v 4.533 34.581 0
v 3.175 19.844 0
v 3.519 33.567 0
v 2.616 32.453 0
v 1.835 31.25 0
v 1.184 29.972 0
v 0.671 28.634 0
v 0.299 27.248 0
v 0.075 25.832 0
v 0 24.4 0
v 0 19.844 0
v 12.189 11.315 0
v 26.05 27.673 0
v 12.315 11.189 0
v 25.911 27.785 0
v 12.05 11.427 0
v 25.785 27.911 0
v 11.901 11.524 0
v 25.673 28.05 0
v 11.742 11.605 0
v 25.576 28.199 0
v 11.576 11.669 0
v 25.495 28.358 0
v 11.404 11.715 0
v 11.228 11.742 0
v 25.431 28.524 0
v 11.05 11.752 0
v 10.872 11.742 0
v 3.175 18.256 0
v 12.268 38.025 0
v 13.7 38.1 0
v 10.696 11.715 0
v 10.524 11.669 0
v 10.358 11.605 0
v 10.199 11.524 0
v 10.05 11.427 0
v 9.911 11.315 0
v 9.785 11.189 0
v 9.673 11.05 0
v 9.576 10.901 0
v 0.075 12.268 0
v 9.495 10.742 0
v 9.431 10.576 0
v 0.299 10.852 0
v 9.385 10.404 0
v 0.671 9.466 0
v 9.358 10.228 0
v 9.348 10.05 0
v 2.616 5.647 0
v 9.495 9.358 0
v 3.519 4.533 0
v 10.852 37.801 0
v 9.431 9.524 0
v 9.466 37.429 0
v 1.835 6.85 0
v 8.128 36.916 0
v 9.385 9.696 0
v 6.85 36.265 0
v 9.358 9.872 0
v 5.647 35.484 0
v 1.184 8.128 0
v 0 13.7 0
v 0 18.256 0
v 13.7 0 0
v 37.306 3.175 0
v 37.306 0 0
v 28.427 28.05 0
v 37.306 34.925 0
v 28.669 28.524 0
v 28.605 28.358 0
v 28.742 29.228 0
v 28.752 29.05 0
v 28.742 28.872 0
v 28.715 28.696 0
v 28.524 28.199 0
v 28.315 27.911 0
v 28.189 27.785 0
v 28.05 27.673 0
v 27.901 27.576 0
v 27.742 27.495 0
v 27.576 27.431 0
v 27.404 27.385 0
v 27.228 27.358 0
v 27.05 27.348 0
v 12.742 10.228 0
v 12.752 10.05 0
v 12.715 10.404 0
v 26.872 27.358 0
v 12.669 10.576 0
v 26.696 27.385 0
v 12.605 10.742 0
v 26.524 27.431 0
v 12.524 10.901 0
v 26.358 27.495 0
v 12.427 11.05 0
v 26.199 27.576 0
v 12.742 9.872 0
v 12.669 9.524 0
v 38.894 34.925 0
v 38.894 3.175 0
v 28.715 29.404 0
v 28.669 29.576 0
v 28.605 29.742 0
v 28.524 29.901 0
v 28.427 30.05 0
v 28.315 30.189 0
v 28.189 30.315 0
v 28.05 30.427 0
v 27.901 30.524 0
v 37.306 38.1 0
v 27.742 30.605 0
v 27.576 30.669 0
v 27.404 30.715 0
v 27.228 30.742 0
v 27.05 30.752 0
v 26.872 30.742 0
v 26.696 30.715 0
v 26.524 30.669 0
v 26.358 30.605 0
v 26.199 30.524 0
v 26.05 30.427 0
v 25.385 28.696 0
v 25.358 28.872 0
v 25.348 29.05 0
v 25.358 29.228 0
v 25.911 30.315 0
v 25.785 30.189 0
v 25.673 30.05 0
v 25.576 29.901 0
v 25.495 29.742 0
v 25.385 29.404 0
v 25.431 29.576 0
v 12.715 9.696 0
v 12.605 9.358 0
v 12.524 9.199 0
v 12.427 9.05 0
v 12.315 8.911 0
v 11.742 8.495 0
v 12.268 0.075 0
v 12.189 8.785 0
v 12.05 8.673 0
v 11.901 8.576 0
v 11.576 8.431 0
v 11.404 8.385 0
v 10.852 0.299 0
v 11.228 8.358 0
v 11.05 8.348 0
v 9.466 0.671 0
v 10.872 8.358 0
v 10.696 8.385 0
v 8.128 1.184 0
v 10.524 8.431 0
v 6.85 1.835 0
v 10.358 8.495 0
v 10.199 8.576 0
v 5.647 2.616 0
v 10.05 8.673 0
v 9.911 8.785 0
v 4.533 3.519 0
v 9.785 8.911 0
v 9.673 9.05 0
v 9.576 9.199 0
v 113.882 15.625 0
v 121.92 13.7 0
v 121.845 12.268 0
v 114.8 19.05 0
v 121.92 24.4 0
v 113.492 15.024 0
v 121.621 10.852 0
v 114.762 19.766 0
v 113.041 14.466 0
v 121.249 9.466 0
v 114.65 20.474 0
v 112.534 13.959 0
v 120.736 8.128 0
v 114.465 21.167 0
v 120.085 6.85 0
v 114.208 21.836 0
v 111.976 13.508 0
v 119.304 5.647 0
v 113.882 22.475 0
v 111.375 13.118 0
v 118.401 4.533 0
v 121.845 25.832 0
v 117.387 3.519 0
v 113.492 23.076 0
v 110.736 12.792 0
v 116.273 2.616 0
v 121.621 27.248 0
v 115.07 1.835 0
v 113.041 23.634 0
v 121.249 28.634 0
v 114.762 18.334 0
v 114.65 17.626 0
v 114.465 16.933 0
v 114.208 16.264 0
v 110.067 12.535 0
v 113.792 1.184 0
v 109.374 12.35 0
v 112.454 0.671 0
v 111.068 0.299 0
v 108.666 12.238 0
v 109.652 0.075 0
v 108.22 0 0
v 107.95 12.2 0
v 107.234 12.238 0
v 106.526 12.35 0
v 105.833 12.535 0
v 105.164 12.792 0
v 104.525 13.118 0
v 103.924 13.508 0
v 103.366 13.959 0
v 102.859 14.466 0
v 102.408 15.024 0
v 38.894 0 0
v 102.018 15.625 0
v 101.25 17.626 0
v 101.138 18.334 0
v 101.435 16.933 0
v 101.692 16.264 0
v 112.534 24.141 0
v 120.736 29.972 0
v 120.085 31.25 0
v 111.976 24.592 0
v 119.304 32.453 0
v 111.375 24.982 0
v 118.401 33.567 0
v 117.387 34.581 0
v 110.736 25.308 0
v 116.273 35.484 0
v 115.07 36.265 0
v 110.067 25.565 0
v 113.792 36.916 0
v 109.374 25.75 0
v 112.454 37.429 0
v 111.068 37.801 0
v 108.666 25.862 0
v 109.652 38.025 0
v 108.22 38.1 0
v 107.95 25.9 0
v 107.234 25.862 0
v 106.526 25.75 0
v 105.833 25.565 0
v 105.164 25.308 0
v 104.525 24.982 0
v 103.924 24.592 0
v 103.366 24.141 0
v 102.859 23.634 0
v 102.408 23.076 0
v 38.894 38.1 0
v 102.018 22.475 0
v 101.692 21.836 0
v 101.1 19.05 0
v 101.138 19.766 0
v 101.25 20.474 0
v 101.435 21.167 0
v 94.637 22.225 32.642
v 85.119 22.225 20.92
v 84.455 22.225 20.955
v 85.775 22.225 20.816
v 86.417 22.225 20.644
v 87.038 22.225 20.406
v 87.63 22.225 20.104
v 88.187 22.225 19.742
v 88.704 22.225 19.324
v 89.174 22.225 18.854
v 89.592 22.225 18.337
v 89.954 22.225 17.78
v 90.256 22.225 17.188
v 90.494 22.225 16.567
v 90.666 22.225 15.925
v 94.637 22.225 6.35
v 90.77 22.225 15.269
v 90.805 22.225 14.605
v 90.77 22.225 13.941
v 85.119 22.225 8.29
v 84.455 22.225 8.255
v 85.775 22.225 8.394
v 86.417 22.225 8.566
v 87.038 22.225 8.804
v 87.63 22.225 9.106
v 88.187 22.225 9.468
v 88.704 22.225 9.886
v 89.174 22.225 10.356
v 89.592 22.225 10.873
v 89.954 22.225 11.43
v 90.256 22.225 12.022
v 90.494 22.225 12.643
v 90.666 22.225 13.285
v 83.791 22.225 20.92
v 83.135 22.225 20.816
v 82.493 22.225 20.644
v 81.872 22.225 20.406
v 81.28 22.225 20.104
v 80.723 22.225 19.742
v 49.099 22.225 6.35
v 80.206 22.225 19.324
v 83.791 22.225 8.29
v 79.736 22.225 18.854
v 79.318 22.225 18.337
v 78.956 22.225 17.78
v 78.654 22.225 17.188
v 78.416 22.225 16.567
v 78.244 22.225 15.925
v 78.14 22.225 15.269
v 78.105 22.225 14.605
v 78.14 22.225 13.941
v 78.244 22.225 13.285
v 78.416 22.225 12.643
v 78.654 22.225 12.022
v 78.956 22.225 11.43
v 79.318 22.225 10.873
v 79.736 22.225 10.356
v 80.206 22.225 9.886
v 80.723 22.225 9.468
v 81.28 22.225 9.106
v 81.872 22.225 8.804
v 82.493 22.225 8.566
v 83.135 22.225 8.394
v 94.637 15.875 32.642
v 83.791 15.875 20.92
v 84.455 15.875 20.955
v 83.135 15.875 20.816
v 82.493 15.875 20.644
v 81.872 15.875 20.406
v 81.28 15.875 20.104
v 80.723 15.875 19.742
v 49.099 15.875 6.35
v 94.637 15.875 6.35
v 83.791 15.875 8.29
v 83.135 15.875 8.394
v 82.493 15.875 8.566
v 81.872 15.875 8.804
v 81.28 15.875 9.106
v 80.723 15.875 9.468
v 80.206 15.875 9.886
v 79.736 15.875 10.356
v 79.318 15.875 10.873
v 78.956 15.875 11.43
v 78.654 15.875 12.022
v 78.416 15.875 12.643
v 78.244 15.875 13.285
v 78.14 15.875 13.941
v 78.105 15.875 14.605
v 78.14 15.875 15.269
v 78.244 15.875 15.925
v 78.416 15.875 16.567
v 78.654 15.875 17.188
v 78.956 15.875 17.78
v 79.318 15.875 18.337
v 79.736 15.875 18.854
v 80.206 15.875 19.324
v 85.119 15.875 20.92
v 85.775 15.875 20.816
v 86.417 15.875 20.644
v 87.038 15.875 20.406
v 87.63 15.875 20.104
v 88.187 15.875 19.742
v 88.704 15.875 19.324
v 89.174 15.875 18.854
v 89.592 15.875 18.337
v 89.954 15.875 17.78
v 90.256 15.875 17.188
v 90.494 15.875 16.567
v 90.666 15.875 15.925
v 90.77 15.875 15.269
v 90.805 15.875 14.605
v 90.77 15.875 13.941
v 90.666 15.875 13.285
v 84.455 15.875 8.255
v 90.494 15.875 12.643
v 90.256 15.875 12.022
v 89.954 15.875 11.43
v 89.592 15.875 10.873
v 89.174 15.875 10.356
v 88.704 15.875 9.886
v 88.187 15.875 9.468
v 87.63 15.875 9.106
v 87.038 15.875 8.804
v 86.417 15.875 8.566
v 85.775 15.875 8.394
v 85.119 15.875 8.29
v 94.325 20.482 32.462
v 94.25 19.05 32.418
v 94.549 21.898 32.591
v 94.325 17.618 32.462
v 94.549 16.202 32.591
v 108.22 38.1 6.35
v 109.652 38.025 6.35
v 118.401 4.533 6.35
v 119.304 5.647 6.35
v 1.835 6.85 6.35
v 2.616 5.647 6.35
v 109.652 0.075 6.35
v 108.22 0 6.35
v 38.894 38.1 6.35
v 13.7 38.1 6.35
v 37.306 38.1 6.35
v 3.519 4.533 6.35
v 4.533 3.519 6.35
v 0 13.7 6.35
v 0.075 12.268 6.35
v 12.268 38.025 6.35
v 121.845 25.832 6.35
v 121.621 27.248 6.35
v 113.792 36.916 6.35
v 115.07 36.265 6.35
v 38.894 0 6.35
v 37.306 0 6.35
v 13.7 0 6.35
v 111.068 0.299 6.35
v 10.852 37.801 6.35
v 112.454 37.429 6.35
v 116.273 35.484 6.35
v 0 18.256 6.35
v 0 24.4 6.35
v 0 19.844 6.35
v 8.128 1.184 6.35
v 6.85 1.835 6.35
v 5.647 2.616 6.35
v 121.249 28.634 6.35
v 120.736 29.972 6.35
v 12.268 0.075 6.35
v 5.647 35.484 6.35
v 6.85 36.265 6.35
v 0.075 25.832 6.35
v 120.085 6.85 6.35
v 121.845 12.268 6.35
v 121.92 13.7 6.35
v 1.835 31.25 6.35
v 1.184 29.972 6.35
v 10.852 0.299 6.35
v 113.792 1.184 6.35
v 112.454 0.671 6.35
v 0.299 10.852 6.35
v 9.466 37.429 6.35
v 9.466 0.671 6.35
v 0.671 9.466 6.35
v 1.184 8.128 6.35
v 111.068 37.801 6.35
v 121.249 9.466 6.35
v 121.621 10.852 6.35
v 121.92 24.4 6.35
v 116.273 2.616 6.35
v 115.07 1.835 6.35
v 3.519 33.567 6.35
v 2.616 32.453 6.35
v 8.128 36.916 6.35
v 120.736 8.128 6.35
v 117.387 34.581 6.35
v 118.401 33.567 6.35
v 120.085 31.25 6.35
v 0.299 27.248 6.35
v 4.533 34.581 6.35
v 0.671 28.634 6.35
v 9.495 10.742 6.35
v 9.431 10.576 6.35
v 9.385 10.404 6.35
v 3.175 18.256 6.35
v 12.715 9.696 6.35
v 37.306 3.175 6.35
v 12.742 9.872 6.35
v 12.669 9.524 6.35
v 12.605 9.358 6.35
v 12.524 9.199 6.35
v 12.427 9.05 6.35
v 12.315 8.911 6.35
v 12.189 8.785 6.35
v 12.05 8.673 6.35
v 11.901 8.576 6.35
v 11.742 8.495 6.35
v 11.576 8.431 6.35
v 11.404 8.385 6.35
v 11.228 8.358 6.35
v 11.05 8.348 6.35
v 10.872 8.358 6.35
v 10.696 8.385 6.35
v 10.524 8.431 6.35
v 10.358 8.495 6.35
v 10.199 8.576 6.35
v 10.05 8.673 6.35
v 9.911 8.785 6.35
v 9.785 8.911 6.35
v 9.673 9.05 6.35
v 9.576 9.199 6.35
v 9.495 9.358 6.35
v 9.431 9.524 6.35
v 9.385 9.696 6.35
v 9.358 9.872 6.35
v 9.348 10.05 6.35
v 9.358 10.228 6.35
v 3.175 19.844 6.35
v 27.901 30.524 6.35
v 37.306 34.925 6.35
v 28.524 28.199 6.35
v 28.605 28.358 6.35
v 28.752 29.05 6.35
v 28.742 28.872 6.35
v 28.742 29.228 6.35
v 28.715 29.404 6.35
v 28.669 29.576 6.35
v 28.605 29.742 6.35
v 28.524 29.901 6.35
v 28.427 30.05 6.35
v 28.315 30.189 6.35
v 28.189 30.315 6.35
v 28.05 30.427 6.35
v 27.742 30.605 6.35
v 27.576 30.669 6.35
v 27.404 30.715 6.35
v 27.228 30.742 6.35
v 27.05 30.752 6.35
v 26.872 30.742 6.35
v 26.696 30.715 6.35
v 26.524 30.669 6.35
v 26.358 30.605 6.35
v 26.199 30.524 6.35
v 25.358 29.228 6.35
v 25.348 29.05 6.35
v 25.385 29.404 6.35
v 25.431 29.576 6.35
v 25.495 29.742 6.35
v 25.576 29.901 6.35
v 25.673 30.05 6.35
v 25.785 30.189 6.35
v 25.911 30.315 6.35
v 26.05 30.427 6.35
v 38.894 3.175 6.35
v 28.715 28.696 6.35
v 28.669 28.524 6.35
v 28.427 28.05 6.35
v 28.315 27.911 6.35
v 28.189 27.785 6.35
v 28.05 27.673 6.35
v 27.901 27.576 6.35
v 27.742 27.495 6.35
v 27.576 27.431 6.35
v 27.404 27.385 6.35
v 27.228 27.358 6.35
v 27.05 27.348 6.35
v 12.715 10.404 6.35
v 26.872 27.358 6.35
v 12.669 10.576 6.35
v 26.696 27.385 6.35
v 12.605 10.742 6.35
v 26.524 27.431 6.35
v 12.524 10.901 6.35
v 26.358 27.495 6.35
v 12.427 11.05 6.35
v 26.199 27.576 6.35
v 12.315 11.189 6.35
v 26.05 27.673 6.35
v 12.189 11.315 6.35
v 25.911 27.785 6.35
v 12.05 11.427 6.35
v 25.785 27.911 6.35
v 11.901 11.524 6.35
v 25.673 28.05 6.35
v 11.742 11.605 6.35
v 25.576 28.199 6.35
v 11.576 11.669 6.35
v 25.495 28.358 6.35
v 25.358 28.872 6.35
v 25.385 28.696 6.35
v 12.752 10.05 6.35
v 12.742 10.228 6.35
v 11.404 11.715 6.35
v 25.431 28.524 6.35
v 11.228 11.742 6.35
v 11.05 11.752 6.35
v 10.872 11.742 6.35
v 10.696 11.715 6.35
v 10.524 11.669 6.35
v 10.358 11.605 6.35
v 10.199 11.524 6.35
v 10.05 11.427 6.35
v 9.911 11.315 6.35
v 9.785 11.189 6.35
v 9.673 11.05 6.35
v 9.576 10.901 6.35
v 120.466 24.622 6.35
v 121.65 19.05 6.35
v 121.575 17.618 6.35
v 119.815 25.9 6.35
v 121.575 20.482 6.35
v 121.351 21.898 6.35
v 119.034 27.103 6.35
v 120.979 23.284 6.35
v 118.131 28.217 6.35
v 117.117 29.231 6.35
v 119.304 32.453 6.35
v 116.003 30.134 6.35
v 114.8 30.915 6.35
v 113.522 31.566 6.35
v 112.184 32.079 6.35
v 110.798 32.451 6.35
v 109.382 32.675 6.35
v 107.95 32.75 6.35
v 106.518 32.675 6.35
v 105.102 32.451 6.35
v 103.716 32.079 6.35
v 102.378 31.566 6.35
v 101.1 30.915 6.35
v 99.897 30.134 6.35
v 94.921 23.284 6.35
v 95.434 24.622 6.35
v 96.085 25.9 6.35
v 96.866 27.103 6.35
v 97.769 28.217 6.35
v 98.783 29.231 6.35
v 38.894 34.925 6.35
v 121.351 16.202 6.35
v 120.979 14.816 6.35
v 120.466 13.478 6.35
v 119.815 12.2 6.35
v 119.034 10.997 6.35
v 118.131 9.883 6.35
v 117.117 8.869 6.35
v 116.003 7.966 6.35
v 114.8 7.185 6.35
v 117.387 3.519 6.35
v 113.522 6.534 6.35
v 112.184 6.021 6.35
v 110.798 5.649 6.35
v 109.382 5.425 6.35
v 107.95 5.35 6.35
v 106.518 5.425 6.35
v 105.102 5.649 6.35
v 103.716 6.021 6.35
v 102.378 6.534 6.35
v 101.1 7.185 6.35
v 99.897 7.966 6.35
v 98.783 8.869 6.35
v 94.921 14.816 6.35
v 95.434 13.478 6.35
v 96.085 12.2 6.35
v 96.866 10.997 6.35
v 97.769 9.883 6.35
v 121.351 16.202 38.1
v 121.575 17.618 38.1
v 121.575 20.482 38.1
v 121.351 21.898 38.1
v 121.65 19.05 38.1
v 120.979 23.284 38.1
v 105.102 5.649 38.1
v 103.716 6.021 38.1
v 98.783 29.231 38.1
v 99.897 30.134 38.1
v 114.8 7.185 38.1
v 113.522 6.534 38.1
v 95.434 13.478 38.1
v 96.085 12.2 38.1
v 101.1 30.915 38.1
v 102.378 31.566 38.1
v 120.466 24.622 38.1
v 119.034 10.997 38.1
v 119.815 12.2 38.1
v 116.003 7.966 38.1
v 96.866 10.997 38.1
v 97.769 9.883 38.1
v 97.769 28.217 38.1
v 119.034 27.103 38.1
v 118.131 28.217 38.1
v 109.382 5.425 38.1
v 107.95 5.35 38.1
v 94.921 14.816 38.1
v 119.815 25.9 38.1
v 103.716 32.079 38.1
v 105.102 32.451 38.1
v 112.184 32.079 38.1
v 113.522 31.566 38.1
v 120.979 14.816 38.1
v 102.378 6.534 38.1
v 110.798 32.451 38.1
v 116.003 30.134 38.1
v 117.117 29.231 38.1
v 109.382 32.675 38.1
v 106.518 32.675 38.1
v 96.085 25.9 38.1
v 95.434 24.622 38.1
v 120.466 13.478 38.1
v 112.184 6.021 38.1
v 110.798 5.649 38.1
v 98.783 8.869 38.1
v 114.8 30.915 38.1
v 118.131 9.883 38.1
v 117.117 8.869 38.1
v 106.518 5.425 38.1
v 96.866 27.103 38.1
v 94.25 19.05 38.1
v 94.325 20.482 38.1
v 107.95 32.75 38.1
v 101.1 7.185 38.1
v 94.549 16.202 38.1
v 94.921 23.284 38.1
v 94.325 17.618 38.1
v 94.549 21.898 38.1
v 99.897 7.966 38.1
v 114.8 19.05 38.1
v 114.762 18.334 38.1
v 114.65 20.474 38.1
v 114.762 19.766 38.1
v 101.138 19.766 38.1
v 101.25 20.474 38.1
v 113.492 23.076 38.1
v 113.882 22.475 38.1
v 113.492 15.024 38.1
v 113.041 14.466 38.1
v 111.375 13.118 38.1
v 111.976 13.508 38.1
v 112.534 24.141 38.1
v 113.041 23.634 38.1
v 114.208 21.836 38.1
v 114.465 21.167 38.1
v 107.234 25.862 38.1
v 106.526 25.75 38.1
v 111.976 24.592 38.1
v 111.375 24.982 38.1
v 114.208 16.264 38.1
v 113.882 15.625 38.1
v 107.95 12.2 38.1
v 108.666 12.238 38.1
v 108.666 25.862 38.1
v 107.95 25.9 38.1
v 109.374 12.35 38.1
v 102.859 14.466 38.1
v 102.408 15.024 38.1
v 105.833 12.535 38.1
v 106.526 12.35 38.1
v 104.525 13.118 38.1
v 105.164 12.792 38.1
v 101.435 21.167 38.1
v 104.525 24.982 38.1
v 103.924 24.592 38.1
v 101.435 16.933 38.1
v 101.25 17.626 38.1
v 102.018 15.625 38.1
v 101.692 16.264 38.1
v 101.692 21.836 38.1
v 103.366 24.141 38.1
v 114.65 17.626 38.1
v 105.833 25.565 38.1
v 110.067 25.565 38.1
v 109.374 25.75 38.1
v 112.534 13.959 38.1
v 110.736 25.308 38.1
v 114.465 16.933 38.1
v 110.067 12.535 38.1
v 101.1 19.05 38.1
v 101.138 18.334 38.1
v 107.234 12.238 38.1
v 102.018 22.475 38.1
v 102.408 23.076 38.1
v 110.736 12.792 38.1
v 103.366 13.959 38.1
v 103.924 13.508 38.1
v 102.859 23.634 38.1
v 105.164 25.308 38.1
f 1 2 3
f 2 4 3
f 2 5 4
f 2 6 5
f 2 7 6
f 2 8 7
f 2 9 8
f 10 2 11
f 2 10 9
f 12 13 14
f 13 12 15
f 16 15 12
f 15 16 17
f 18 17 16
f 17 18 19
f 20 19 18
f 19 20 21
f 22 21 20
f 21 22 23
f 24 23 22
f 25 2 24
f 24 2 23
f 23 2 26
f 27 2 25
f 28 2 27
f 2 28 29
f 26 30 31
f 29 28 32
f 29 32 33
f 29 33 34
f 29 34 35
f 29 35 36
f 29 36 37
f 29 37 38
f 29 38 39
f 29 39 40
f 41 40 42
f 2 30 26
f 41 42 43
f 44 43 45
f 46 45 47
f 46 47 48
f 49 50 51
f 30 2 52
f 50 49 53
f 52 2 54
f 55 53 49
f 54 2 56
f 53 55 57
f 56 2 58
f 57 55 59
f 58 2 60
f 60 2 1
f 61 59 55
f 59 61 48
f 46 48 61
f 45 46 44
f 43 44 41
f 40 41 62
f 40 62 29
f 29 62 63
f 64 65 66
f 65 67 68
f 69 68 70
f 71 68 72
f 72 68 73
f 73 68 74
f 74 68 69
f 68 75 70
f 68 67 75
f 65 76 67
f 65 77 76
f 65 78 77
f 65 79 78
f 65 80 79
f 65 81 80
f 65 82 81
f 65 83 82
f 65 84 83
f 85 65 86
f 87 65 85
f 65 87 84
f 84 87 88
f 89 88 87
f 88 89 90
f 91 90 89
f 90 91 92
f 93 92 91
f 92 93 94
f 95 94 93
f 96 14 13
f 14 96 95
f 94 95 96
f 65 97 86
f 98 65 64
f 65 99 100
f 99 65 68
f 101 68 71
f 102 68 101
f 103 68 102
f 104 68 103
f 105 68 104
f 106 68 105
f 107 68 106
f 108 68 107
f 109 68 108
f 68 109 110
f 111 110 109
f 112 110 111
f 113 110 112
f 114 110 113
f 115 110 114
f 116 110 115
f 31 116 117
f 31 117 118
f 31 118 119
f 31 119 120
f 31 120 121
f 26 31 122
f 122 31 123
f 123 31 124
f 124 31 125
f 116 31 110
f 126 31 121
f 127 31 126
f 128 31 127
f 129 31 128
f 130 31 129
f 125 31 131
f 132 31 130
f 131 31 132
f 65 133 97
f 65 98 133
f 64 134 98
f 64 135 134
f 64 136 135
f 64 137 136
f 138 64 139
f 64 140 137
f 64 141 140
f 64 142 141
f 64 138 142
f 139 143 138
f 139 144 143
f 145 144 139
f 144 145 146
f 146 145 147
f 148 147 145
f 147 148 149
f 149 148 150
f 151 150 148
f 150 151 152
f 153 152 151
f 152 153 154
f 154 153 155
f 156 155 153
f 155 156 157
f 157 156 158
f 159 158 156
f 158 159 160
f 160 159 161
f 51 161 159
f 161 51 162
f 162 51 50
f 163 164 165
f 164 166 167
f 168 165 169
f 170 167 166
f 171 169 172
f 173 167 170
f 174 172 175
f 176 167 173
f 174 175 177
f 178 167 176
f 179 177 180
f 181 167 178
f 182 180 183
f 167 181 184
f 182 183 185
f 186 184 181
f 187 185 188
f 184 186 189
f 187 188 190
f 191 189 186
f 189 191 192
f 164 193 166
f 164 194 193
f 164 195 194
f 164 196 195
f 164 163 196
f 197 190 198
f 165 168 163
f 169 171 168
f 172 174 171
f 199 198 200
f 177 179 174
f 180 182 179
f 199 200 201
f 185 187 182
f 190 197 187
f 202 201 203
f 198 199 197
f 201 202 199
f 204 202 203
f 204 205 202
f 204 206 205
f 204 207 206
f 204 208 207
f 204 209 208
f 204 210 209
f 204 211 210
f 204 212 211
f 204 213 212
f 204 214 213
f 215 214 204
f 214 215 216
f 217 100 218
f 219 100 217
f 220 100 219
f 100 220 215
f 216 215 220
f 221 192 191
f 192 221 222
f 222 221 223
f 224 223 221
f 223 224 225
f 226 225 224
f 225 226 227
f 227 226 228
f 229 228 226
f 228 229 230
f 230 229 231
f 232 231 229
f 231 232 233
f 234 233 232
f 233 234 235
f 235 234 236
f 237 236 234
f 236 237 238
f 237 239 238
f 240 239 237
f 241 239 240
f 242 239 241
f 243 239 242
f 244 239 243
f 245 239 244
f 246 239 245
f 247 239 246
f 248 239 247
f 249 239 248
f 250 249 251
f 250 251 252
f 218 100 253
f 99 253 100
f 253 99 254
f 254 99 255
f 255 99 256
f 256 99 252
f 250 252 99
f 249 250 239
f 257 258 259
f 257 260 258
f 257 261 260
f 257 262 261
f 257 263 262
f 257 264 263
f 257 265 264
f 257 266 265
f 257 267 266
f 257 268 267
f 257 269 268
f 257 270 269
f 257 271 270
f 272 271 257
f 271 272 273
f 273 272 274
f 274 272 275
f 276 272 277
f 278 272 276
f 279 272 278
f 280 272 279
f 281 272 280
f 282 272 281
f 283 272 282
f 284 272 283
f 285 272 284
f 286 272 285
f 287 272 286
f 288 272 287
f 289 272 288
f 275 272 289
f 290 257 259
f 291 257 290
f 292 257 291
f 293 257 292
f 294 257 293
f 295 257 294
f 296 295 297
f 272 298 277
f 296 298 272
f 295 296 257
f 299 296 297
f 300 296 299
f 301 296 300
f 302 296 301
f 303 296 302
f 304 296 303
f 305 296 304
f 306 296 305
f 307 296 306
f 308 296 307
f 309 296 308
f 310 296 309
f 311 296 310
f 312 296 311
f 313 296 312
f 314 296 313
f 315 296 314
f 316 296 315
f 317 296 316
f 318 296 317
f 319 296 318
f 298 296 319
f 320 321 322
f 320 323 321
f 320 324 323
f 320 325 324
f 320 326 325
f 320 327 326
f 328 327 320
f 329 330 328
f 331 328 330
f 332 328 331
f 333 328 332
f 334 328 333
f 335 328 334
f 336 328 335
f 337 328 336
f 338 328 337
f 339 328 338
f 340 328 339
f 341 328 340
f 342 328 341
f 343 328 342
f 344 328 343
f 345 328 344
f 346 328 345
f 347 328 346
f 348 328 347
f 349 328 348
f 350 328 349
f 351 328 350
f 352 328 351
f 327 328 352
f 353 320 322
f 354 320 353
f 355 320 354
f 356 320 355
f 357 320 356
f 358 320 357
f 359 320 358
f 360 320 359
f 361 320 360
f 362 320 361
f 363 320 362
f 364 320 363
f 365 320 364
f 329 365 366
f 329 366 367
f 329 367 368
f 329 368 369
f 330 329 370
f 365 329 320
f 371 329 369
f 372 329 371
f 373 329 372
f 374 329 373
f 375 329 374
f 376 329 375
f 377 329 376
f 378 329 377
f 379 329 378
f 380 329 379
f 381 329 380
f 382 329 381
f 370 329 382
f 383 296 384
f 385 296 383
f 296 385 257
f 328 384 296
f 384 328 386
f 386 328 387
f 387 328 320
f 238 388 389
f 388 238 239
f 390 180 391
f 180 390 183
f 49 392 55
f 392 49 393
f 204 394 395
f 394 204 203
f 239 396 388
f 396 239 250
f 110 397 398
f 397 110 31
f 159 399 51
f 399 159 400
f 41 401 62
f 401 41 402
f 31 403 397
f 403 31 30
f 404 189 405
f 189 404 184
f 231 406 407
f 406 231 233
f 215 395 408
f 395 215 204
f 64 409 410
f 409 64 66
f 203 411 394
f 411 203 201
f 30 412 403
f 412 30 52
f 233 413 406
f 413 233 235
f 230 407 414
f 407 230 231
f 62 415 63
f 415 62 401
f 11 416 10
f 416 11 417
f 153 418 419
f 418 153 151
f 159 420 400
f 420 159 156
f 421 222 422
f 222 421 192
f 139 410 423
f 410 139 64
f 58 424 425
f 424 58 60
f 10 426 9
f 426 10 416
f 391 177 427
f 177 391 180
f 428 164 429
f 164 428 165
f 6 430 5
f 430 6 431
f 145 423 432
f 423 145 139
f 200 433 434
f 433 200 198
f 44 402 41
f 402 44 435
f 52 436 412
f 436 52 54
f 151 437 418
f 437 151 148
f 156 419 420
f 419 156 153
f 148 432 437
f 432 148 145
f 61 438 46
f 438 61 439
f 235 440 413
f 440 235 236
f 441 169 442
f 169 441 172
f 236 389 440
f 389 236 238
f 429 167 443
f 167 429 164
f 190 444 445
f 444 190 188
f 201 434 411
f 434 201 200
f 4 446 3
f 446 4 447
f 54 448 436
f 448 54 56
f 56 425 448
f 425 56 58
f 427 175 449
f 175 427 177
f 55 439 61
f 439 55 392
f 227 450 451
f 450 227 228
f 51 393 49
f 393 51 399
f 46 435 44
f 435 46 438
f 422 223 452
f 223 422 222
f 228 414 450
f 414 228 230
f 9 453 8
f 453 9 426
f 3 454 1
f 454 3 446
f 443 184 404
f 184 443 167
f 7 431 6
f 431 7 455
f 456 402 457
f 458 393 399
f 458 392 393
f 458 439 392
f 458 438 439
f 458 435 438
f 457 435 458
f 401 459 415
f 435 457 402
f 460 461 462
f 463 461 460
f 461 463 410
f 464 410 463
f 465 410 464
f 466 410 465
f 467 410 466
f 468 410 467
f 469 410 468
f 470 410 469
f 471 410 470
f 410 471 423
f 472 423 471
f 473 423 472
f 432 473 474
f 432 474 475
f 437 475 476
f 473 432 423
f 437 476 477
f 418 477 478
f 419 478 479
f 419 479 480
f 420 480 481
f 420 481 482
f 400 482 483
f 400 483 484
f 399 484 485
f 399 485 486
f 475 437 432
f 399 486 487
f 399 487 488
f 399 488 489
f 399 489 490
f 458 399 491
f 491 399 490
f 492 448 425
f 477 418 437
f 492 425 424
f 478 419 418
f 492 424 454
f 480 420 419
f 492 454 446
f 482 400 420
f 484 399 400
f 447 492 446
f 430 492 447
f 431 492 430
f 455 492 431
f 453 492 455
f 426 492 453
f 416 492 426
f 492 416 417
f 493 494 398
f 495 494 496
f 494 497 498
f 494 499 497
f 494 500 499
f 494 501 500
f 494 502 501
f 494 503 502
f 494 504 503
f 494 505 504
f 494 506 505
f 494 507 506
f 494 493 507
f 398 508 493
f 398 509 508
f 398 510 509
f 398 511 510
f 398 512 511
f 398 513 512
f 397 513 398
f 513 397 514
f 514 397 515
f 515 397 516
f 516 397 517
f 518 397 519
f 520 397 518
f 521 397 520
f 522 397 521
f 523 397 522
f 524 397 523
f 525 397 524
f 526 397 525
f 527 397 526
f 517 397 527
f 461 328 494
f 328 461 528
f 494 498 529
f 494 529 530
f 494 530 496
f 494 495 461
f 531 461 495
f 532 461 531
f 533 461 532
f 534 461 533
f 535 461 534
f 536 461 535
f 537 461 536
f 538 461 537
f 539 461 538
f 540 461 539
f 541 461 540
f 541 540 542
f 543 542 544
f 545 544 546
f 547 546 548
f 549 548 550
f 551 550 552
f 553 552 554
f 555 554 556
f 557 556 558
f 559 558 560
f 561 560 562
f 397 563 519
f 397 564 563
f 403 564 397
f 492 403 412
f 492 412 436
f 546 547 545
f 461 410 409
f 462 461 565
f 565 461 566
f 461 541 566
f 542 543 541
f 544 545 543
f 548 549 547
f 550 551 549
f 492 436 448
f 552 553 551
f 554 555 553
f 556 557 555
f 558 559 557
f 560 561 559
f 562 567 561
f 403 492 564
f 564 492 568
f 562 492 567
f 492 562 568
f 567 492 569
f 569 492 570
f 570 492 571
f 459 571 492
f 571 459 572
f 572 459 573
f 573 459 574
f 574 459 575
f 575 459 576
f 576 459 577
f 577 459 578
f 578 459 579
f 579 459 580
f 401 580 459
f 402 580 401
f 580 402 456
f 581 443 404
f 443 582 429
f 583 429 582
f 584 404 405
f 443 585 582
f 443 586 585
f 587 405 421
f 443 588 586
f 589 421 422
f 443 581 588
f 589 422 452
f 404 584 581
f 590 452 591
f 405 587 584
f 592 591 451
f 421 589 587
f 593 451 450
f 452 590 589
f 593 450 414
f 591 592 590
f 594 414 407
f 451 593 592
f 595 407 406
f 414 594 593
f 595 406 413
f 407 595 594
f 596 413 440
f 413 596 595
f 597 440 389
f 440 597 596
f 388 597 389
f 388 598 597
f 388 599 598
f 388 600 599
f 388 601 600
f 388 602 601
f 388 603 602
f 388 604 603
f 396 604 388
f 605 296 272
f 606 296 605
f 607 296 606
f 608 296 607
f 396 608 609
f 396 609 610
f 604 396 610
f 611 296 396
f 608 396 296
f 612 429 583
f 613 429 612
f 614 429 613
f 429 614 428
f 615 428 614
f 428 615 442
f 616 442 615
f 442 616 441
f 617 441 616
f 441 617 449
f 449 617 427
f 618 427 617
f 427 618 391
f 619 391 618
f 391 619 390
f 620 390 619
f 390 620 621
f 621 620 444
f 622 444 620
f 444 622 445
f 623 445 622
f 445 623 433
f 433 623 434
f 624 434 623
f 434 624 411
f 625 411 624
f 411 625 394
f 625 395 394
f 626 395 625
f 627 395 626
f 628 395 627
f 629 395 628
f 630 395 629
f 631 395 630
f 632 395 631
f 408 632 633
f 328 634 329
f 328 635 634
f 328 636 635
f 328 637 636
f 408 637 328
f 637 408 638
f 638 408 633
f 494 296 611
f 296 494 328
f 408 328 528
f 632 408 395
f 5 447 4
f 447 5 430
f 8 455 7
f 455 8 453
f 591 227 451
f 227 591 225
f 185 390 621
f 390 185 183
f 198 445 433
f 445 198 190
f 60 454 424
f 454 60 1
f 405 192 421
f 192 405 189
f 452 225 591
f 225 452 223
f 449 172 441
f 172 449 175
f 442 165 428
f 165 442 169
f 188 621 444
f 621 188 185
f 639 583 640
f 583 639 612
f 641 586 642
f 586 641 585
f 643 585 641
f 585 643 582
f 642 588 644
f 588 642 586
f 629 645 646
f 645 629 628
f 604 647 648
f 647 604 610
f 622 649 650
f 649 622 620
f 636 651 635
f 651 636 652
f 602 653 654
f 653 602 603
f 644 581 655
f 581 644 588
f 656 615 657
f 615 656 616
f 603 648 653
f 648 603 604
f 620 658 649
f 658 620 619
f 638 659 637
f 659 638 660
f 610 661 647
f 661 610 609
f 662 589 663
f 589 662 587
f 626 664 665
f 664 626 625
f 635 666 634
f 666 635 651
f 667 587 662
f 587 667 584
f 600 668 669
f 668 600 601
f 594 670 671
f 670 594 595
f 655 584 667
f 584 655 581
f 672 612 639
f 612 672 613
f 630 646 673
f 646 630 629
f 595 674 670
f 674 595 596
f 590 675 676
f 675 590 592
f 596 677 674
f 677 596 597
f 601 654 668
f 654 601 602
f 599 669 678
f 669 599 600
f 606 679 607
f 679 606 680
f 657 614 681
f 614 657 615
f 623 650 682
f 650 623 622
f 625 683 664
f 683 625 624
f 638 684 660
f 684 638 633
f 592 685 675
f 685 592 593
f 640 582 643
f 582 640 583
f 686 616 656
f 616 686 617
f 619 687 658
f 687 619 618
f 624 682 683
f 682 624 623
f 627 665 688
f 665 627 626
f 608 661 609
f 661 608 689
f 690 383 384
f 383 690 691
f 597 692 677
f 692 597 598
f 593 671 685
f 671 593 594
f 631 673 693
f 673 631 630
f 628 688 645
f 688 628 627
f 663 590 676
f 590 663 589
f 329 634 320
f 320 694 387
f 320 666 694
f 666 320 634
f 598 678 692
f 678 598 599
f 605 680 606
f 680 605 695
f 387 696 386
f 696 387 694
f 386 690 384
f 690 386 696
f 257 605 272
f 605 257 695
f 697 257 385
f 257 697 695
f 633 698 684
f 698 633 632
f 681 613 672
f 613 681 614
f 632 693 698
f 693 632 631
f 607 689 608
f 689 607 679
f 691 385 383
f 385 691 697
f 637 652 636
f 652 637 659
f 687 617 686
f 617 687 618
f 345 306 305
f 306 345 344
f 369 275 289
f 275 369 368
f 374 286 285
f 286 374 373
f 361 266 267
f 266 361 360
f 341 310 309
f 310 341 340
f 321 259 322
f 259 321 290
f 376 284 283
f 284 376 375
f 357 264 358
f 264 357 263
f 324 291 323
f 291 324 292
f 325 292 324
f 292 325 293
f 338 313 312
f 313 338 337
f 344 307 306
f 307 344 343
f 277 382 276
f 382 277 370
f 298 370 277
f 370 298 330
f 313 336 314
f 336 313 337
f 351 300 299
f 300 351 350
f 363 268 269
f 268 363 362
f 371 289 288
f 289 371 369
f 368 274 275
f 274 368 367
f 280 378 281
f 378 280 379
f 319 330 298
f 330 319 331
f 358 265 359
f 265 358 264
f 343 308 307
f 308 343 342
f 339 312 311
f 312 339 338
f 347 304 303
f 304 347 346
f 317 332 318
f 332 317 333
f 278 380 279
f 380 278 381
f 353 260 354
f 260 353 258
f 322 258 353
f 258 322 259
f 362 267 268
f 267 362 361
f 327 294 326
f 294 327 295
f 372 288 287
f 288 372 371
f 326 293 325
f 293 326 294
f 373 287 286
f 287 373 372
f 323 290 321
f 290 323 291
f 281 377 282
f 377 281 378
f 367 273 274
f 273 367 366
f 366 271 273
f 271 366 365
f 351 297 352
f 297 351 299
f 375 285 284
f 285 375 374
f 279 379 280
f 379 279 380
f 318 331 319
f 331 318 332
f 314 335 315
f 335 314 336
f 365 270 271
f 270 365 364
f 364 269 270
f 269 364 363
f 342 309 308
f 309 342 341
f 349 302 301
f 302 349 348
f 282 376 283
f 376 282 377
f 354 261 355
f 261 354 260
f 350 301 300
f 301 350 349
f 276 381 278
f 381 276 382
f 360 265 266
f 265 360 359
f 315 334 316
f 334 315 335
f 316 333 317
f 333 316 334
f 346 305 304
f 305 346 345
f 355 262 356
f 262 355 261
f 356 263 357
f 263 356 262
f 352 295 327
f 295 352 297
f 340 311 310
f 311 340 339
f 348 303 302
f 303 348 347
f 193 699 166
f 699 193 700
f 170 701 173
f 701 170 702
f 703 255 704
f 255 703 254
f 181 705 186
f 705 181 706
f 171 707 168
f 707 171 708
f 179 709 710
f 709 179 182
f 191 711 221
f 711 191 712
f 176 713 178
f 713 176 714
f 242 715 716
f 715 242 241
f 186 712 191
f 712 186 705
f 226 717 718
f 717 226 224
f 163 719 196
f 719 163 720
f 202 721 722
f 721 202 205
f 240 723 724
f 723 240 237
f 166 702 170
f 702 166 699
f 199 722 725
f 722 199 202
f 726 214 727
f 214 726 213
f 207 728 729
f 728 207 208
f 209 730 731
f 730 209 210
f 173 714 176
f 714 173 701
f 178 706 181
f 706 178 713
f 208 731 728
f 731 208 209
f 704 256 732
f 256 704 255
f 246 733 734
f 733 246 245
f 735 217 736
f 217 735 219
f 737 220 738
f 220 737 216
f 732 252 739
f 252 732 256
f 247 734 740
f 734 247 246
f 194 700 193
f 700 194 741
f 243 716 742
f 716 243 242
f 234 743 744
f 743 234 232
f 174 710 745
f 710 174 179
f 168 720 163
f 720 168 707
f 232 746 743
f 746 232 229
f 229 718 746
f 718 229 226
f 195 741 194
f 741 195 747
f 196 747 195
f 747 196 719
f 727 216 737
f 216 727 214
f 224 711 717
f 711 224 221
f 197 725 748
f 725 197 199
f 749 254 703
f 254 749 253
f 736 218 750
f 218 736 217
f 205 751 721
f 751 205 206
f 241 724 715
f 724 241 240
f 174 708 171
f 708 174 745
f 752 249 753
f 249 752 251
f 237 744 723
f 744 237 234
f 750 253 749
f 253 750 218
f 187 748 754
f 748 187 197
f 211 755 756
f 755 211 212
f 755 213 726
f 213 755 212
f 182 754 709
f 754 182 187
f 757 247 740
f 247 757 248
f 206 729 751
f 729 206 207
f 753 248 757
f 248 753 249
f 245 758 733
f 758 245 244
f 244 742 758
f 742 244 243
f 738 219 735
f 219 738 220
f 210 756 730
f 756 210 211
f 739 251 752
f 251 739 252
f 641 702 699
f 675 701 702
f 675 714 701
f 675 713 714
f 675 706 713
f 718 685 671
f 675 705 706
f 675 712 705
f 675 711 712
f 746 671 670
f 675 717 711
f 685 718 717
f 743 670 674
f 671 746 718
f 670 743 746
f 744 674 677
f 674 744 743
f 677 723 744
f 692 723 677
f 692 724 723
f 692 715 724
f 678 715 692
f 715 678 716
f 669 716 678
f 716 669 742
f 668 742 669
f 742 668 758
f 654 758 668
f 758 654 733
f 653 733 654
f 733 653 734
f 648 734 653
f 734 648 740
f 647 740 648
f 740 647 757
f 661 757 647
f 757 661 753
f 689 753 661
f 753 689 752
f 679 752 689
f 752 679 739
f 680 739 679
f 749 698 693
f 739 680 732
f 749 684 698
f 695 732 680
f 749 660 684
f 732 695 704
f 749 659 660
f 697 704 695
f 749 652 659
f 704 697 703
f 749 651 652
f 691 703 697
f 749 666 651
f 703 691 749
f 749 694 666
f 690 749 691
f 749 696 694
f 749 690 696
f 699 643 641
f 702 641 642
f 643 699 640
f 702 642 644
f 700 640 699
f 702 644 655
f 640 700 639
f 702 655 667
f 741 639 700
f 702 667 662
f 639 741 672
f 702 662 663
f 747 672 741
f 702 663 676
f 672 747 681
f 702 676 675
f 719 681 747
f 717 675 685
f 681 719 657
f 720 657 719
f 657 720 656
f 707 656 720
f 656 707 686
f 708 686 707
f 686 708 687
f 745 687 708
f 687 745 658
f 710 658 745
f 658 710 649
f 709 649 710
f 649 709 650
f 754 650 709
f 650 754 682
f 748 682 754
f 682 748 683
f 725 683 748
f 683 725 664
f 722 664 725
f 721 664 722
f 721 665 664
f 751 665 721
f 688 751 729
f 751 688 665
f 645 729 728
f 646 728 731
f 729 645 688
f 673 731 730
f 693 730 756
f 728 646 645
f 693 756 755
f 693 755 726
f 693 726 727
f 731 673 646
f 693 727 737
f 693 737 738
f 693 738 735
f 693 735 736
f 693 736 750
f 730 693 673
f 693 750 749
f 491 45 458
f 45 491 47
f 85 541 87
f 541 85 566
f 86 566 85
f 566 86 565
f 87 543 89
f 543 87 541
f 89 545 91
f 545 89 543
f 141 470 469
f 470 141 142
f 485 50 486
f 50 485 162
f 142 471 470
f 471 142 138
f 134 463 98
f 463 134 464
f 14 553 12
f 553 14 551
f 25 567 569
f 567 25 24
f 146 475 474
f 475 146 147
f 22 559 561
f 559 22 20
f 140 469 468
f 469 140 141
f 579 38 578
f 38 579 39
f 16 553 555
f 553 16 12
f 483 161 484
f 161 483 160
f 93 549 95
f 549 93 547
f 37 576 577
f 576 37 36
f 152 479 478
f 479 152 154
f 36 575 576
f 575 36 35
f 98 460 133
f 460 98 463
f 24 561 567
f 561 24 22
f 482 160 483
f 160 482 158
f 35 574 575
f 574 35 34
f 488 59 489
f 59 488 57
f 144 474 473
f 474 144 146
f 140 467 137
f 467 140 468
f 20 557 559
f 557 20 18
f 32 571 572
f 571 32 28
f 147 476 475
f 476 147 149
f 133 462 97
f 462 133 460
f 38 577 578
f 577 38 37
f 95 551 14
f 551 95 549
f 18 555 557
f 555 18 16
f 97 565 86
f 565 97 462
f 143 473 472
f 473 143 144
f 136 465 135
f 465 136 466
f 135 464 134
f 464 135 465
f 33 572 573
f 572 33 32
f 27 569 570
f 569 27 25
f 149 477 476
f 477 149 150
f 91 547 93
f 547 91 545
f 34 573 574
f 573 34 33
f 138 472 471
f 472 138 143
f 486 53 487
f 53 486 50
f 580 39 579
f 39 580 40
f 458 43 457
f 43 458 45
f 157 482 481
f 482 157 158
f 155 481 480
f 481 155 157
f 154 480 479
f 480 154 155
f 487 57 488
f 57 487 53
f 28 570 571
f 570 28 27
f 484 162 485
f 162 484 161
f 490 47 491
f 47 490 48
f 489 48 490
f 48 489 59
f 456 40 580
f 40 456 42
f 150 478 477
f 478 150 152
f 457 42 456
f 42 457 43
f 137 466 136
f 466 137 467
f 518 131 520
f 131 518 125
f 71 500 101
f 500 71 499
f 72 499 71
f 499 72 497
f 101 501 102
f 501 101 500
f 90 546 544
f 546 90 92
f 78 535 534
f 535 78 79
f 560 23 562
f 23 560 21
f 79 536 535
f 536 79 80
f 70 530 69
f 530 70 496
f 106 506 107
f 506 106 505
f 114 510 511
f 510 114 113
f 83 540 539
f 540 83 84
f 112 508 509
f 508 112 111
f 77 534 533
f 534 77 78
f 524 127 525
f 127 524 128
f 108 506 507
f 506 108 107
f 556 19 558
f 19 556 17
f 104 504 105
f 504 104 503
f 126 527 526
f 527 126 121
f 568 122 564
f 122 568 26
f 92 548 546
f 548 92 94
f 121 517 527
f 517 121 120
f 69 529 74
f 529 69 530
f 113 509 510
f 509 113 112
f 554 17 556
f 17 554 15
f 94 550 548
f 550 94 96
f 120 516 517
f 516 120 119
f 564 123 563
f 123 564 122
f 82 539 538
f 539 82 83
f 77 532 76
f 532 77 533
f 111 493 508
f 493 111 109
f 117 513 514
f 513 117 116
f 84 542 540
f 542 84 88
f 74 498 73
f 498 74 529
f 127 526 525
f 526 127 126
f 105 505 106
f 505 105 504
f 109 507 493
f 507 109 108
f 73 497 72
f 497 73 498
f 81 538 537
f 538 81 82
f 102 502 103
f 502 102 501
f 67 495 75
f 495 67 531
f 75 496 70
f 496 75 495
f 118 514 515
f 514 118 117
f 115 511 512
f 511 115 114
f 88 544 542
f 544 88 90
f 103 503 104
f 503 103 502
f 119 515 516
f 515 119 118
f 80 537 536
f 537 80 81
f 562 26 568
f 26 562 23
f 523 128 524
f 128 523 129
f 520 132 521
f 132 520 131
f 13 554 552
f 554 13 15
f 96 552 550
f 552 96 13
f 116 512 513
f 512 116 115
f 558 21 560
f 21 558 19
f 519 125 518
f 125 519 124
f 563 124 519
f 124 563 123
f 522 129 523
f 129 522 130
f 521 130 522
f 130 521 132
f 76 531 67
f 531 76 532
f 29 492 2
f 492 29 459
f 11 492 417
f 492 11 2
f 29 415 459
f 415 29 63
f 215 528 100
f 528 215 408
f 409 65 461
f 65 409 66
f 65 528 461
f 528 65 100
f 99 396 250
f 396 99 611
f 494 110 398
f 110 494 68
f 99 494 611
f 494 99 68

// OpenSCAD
$fn=60;

function in(d) = 25.4 * d;

J_BOLT_DIA=in(1/2)+1;

LUMBER_W=1.5;
LUMBER_H=5.5;

8_PENNY_SHANK=0.134;

L=4.8;
T=0.25;
W=1.5;

module j_bolt(){

  dia=J_BOLT_DIA;
  
  color([1,0,0])
    translate([0,0,-in(01.5)])
    cylinder(d=dia, h=in(12));
  translate([0,0,in(9.5)])
  color([1,0,0])
    cylinder(d=in(2), h=in(0.125));
  translate([0,0,in(9.9)])
    color([1,0,0])
    cube([in(1),in(1),in(0.5)],center=true);
}

module nail() {
  cylinder(r=in(8_PENNY_SHANK/2),h=in(2.5));
}
/*
translate([0,0,in(-LUMBER_H)])
color([.5,0,.3])
cube([in(LUMBER_W),in(24),in(LUMBER_H)]);

color([0,1,0])
translate([in(LUMBER_W),0,in(0)])
# cube([in(LUMBER_H),in(24),in(LUMBER_W)]);
*/
/* holder */
difference(){
  difference(){
    difference(){
      difference(){
        difference(){
          union(){
            hull(){
              translate([J_BOLT_DIA,J_BOLT_DIA,0])
                cylinder(r=J_BOLT_DIA,h=in(T));
              translate([J_BOLT_DIA,in(W)-J_BOLT_DIA,0])
                cylinder(r=J_BOLT_DIA,h=in(T));
              translate([in(L)-J_BOLT_DIA,J_BOLT_DIA,0])
                cylinder(r=J_BOLT_DIA,h=in(T));
              translate([in(L)-J_BOLT_DIA,in(W)-J_BOLT_DIA,0])
                cylinder(r=J_BOLT_DIA,h=in(T));
            }
            translate([in(LUMBER_W)+in(LUMBER_H/2),in(W/2),0]){
              cylinder(r=J_BOLT_DIA,h=in(LUMBER_W));
            }
            translate([in(1.5),in(W/2)-in(T/2),0]){
              difference(){
                cube([in(2.5),in(T),in(LUMBER_W)]);
                translate([0,-1,0])
                  rotate([0,-30,0])
                  cube([in(6),in(W),in(6)]);
              }
            }
          }
          translate([in(3.325),0,in(2.3*T)])
            rotate([-90,0,0])
            cylinder(r=in(T),h=100);
        }
        translate([in(LUMBER_W)+in(LUMBER_H/2),in(W/2),in(-8)])
          j_bolt();
      }
      union(){
        translate([in(LUMBER_W/2)-8,in(LUMBER_W/2)-9,-25])
          nail();
        translate([in(LUMBER_W/2)+8,in(LUMBER_W/2)+10,-25])
          nail();
      }
      translate([0,in(W/2),0])
        cube([in(0.25),in(0.125/2),in(2)],center=true);
    }
    translate([in(LUMBER_W),0,0])
      cube([in(0.125/2),in(0.25),in(2)],center=true);
  }
  translate([in(LUMBER_W),in(W),0])
    cube([in(0.125/2),in(0.25),in(2)],center=true);

}
